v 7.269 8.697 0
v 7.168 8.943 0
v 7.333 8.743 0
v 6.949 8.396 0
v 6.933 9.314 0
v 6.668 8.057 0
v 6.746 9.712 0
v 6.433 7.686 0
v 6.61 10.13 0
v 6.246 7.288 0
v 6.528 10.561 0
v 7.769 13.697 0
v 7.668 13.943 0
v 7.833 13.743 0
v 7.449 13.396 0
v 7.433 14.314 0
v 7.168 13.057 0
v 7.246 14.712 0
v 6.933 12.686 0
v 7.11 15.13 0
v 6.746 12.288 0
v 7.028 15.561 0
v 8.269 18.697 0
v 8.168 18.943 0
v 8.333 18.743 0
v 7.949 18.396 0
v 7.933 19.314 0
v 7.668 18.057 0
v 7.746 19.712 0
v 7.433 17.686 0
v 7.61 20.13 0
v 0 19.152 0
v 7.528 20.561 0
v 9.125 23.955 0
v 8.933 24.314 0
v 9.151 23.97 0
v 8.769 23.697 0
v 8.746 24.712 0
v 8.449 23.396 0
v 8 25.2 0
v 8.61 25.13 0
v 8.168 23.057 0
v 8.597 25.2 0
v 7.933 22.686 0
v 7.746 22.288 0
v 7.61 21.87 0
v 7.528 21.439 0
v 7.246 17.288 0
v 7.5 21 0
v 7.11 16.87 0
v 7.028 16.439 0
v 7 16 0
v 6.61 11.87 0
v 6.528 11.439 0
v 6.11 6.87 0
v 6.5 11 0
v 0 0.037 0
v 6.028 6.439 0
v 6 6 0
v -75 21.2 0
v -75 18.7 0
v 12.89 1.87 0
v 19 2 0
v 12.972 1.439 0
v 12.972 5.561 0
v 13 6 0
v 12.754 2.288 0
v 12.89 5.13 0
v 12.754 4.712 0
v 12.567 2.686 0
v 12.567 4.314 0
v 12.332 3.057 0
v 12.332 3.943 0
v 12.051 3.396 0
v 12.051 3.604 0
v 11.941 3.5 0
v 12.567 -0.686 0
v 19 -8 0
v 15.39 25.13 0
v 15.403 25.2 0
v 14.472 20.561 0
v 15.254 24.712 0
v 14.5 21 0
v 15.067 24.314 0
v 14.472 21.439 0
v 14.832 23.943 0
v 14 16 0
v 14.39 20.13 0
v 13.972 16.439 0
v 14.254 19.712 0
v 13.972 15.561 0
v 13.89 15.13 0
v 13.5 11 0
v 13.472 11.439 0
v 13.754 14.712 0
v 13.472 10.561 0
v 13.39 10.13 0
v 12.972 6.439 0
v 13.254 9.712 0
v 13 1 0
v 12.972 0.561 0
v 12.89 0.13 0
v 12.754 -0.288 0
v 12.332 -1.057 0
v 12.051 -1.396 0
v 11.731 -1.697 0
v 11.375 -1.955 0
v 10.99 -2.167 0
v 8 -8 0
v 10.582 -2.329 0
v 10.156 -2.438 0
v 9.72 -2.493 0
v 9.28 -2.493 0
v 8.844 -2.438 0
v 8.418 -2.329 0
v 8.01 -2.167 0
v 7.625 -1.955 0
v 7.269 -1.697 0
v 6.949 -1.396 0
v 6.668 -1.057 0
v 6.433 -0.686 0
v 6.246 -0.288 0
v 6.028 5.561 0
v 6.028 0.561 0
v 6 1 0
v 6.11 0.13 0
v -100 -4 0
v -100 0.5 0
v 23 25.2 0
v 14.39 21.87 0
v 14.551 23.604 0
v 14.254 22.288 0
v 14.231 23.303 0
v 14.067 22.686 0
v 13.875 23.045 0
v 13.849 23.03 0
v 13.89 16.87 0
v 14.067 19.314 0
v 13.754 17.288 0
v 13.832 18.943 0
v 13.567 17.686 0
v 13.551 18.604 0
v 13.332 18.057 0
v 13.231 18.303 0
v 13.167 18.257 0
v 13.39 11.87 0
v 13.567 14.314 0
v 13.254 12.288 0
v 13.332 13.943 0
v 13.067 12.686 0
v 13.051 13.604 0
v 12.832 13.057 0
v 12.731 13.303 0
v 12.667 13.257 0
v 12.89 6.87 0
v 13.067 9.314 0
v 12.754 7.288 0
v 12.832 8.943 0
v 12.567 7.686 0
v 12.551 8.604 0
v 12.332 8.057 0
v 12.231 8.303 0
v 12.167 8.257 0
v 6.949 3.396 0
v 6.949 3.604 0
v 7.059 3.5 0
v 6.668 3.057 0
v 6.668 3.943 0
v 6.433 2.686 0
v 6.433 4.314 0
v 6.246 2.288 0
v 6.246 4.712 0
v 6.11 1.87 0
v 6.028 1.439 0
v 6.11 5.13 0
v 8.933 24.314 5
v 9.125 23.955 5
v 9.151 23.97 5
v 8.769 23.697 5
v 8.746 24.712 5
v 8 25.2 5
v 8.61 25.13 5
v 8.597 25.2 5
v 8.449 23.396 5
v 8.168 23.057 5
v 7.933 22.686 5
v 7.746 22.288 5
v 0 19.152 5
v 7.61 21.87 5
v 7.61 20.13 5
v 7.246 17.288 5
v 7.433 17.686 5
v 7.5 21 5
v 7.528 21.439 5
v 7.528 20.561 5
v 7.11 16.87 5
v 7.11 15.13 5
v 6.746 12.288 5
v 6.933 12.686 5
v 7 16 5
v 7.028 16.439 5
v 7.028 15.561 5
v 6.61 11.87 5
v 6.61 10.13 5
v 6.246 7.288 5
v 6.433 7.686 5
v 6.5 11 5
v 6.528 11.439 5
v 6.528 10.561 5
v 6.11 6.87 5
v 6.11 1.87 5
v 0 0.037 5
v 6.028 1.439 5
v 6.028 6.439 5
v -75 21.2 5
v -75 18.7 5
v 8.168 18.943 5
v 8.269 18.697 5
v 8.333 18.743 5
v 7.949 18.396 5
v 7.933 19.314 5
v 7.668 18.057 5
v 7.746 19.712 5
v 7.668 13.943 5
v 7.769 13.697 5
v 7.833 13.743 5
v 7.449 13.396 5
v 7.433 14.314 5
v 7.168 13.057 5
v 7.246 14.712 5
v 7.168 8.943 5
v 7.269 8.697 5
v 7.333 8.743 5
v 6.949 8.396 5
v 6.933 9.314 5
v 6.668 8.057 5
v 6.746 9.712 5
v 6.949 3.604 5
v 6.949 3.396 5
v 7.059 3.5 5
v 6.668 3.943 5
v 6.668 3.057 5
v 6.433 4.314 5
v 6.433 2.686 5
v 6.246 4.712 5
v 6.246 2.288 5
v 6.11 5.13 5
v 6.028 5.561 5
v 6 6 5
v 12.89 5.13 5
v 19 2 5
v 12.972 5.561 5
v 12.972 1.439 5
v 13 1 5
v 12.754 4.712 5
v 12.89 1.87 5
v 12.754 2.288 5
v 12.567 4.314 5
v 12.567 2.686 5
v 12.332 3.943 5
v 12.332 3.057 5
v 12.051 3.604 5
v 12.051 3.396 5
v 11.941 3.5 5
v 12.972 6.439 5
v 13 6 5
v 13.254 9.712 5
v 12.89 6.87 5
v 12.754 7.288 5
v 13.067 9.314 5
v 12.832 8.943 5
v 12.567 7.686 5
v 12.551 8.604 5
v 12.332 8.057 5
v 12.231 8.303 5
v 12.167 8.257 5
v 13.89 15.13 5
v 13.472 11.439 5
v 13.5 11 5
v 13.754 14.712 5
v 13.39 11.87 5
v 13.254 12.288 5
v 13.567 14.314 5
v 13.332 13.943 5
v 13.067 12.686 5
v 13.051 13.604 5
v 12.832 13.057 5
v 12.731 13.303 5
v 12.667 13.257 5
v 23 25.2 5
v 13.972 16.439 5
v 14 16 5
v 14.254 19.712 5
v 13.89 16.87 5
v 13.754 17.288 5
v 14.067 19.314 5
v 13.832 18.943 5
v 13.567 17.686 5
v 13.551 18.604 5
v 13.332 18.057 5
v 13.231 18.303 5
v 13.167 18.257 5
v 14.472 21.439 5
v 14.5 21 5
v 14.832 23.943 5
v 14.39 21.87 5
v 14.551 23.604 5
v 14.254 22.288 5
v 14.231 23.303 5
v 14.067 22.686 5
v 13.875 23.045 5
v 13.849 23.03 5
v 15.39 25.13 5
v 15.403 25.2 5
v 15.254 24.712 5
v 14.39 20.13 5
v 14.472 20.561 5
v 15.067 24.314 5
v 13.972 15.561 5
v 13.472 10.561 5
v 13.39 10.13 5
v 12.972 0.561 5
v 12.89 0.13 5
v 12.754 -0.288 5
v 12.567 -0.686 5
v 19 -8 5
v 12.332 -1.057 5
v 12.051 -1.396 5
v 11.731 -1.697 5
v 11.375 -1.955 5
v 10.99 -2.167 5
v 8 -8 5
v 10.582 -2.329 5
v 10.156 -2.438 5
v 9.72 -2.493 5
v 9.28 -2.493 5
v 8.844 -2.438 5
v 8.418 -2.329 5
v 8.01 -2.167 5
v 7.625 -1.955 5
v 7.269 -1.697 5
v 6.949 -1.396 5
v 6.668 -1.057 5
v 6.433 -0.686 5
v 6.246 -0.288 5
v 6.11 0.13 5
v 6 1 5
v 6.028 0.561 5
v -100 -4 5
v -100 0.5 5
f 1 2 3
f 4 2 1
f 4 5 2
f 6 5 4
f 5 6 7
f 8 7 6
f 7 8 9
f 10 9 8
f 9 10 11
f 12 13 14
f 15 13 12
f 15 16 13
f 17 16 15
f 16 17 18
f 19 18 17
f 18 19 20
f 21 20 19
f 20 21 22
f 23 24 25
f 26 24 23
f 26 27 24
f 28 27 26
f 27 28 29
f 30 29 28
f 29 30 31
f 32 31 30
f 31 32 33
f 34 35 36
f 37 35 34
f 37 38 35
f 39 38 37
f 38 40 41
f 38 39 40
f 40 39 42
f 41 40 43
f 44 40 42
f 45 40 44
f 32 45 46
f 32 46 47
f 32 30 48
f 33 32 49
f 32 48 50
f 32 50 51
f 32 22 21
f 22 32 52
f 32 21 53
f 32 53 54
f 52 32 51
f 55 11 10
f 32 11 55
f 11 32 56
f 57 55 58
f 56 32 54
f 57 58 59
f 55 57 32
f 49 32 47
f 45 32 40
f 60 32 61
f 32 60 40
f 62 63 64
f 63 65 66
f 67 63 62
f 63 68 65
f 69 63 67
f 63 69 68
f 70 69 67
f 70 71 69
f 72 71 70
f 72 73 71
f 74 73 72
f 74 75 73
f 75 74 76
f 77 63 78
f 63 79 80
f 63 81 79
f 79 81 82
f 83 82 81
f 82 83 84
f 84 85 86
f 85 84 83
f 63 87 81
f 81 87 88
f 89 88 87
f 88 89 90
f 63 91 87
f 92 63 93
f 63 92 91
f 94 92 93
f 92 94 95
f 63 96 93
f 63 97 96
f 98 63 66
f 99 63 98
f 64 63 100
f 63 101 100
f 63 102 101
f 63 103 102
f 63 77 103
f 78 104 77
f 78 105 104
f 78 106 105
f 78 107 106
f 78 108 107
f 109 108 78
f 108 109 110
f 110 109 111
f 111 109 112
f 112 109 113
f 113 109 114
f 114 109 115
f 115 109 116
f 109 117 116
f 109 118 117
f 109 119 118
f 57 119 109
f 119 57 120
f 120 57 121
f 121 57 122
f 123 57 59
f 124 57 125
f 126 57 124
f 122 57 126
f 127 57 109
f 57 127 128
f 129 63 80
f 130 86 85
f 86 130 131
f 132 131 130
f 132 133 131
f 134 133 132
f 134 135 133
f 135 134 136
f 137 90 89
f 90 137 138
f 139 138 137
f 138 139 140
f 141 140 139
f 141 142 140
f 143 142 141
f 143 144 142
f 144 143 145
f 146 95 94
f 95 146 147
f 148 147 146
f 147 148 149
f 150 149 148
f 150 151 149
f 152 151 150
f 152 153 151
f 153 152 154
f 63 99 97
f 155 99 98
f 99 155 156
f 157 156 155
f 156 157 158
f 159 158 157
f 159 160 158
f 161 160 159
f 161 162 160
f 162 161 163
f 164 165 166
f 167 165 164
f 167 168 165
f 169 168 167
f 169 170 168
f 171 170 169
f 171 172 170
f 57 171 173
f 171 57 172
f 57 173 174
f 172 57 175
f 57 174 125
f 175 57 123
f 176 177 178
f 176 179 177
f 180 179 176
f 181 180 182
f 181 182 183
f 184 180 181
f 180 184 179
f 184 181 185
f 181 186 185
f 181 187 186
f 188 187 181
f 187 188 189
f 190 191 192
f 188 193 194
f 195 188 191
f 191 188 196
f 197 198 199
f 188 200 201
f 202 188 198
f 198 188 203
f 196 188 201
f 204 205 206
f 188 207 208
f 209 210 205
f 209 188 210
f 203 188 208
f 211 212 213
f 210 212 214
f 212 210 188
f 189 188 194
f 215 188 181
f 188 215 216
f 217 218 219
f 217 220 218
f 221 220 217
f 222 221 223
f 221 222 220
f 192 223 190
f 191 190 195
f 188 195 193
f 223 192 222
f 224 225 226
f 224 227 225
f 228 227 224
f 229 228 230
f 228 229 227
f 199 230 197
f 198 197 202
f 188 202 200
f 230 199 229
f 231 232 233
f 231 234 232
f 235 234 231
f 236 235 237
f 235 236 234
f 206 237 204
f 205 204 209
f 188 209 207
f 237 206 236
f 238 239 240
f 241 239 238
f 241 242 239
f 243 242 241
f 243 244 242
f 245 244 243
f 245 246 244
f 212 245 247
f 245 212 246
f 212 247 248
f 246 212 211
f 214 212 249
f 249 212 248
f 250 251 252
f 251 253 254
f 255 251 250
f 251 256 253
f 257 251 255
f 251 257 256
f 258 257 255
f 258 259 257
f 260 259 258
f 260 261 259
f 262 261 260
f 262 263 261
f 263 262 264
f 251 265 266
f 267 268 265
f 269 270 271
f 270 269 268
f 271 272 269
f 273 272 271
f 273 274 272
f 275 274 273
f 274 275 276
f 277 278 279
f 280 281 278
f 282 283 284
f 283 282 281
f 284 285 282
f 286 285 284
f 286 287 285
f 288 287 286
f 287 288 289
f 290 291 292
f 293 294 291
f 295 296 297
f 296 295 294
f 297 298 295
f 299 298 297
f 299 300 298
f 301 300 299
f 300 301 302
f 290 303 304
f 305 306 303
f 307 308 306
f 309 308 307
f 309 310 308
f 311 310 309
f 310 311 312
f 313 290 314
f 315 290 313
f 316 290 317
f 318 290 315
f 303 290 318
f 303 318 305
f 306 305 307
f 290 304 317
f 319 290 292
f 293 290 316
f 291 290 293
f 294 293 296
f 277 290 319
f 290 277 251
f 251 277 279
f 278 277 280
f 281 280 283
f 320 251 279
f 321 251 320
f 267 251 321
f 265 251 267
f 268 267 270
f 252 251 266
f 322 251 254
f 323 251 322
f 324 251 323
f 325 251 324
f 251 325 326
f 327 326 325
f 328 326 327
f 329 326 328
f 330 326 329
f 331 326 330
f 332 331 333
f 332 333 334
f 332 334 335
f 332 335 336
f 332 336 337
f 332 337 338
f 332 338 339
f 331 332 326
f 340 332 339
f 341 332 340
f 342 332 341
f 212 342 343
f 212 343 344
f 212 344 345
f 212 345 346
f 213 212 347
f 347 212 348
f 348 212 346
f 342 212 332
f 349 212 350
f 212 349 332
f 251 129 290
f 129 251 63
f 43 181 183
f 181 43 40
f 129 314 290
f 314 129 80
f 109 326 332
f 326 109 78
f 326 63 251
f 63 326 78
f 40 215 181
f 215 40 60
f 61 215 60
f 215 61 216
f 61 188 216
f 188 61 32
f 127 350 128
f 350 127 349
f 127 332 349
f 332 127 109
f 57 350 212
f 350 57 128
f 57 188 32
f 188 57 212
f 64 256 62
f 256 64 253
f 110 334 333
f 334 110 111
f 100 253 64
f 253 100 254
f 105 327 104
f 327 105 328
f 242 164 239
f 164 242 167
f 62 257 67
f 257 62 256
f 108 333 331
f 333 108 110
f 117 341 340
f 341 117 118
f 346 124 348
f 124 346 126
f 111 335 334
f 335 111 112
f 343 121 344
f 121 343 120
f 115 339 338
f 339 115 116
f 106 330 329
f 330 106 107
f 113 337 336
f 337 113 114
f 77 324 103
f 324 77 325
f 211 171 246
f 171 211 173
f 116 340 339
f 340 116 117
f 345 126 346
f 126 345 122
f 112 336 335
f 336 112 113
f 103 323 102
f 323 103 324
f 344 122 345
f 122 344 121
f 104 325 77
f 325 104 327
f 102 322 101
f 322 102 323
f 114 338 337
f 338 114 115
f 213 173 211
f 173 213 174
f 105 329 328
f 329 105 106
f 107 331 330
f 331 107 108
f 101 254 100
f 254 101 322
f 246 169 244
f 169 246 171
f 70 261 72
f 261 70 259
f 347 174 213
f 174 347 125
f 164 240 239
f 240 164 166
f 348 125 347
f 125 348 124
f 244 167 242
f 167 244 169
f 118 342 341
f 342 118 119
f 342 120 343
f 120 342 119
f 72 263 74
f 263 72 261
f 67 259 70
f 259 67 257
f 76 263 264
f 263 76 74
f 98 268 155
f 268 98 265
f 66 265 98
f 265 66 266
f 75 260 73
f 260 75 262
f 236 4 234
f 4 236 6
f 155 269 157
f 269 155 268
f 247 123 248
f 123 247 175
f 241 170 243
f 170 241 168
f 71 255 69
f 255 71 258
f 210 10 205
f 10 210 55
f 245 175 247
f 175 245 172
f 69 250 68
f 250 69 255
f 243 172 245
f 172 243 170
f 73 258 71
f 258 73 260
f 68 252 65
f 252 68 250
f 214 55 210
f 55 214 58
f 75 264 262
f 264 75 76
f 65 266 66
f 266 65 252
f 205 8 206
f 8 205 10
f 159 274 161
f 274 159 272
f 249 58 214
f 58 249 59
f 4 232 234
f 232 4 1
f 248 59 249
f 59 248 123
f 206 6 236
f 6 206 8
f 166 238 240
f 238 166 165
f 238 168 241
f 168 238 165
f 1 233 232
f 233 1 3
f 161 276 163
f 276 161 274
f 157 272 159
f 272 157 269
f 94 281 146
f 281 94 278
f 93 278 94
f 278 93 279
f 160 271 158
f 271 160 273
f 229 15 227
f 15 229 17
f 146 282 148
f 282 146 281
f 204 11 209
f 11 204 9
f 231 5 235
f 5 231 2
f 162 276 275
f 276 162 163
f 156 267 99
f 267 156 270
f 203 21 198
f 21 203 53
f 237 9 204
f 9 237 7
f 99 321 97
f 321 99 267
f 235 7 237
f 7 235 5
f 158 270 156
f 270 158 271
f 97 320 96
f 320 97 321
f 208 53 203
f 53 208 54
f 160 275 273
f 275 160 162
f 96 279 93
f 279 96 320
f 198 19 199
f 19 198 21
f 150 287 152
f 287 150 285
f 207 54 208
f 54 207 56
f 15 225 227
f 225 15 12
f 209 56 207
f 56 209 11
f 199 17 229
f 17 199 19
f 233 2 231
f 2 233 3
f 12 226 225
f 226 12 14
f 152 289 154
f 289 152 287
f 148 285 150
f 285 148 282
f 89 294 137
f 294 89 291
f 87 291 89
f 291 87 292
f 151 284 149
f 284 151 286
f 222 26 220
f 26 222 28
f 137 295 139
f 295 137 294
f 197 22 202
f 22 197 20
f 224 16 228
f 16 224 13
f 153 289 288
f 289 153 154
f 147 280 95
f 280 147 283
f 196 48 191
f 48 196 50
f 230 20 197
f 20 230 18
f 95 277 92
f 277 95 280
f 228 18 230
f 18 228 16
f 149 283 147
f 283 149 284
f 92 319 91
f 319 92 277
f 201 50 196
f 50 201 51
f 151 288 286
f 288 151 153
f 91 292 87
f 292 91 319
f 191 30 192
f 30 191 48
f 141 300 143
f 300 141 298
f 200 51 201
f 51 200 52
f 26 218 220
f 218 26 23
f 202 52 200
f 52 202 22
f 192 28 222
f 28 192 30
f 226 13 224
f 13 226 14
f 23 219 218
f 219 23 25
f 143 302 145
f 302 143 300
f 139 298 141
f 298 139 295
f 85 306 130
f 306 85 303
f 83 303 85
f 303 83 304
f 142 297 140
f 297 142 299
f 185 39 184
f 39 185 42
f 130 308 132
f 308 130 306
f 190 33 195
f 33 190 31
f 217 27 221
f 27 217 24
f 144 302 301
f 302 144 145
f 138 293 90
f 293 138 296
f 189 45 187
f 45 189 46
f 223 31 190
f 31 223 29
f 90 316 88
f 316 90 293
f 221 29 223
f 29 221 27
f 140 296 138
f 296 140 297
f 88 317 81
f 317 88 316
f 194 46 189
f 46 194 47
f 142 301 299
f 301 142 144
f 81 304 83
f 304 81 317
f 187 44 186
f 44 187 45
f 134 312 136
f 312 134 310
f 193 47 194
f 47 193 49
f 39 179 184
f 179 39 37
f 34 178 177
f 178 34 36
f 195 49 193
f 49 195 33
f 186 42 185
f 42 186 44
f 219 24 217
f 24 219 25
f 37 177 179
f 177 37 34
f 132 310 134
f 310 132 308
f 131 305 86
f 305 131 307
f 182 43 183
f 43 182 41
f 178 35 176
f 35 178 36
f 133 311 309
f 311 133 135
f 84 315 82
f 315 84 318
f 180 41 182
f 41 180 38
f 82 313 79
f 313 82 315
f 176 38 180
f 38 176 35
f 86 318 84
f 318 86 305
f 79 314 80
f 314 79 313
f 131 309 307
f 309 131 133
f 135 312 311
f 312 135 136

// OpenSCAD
//Width of Shelf
shelfwidth=19.2;

//Clip Thickness
thickness=5;

//MainBodyWidth
mbwidth=8;

//Top support clip length
topcliplength=75;

//Clip Thickness
thickness=5;

//Bottom support clip length
bottomcliplength=100;

//Lower Support Thickness
lsupport=8;

//Upper Support Thickness
usupport=6;

//Clip Parameters
mouthwidth=3.5;

difference(){
union(){ //Combines all Parts    
    
//Render Light WireHolder Opening
linear_extrude (height=thickness)
polygon(points=[
        [mbwidth,-lsupport],
        [mbwidth,shelfwidth+usupport],
        [mbwidth+15,usupport+shelfwidth],
        [(mbwidth+11),-lsupport+10],
        [mbwidth+11,-lsupport],
	    ]);

//Top Clip
linear_extrude (height=thickness)
polygon(points=[
        [mbwidth,shelfwidth],
        [-topcliplength,shelfwidth-.5],
        [-topcliplength,shelfwidth+2],
        [mbwidth,usupport+shelfwidth],
        //[mbwidth,shelfwidth*.267+shelfwidth],
	    ]);

//Bottom Clip
linear_extrude (height=thickness)
polygon(points=[
        [mbwidth,0],
        [-bottomcliplength,.5],
        [-bottomcliplength,-4],
        [mbwidth,-lsupport],		
        //[mbwidth,-shelfwidth*.421],		
	    ]);
//Render Main Body
cube([mbwidth,shelfwidth,thickness]);        
    }       
    
//creates opening for wire    
translate([9.5,1,-10]){
    linear_extrude (height=50)
    circle(mouthwidth, $fn=50);
    }
    
translate([9.5,6,-10]){
    linear_extrude (height=50)
    circle(mouthwidth, $fn=50);
    }
    
translate([10,11,-10]){
    linear_extrude (height=50)
    circle(mouthwidth, $fn=50);
    }    

translate([10.5,16,-10]){
    linear_extrude (height=50)
    circle(mouthwidth, $fn=50);
    }   

translate([11,21,-10]){
    linear_extrude (height=50)
    circle(mouthwidth, $fn=50);
    }   
    
translate([12,26,-10]){
    linear_extrude (height=50)
    circle(mouthwidth, $fn=50);
    }       
}
    
